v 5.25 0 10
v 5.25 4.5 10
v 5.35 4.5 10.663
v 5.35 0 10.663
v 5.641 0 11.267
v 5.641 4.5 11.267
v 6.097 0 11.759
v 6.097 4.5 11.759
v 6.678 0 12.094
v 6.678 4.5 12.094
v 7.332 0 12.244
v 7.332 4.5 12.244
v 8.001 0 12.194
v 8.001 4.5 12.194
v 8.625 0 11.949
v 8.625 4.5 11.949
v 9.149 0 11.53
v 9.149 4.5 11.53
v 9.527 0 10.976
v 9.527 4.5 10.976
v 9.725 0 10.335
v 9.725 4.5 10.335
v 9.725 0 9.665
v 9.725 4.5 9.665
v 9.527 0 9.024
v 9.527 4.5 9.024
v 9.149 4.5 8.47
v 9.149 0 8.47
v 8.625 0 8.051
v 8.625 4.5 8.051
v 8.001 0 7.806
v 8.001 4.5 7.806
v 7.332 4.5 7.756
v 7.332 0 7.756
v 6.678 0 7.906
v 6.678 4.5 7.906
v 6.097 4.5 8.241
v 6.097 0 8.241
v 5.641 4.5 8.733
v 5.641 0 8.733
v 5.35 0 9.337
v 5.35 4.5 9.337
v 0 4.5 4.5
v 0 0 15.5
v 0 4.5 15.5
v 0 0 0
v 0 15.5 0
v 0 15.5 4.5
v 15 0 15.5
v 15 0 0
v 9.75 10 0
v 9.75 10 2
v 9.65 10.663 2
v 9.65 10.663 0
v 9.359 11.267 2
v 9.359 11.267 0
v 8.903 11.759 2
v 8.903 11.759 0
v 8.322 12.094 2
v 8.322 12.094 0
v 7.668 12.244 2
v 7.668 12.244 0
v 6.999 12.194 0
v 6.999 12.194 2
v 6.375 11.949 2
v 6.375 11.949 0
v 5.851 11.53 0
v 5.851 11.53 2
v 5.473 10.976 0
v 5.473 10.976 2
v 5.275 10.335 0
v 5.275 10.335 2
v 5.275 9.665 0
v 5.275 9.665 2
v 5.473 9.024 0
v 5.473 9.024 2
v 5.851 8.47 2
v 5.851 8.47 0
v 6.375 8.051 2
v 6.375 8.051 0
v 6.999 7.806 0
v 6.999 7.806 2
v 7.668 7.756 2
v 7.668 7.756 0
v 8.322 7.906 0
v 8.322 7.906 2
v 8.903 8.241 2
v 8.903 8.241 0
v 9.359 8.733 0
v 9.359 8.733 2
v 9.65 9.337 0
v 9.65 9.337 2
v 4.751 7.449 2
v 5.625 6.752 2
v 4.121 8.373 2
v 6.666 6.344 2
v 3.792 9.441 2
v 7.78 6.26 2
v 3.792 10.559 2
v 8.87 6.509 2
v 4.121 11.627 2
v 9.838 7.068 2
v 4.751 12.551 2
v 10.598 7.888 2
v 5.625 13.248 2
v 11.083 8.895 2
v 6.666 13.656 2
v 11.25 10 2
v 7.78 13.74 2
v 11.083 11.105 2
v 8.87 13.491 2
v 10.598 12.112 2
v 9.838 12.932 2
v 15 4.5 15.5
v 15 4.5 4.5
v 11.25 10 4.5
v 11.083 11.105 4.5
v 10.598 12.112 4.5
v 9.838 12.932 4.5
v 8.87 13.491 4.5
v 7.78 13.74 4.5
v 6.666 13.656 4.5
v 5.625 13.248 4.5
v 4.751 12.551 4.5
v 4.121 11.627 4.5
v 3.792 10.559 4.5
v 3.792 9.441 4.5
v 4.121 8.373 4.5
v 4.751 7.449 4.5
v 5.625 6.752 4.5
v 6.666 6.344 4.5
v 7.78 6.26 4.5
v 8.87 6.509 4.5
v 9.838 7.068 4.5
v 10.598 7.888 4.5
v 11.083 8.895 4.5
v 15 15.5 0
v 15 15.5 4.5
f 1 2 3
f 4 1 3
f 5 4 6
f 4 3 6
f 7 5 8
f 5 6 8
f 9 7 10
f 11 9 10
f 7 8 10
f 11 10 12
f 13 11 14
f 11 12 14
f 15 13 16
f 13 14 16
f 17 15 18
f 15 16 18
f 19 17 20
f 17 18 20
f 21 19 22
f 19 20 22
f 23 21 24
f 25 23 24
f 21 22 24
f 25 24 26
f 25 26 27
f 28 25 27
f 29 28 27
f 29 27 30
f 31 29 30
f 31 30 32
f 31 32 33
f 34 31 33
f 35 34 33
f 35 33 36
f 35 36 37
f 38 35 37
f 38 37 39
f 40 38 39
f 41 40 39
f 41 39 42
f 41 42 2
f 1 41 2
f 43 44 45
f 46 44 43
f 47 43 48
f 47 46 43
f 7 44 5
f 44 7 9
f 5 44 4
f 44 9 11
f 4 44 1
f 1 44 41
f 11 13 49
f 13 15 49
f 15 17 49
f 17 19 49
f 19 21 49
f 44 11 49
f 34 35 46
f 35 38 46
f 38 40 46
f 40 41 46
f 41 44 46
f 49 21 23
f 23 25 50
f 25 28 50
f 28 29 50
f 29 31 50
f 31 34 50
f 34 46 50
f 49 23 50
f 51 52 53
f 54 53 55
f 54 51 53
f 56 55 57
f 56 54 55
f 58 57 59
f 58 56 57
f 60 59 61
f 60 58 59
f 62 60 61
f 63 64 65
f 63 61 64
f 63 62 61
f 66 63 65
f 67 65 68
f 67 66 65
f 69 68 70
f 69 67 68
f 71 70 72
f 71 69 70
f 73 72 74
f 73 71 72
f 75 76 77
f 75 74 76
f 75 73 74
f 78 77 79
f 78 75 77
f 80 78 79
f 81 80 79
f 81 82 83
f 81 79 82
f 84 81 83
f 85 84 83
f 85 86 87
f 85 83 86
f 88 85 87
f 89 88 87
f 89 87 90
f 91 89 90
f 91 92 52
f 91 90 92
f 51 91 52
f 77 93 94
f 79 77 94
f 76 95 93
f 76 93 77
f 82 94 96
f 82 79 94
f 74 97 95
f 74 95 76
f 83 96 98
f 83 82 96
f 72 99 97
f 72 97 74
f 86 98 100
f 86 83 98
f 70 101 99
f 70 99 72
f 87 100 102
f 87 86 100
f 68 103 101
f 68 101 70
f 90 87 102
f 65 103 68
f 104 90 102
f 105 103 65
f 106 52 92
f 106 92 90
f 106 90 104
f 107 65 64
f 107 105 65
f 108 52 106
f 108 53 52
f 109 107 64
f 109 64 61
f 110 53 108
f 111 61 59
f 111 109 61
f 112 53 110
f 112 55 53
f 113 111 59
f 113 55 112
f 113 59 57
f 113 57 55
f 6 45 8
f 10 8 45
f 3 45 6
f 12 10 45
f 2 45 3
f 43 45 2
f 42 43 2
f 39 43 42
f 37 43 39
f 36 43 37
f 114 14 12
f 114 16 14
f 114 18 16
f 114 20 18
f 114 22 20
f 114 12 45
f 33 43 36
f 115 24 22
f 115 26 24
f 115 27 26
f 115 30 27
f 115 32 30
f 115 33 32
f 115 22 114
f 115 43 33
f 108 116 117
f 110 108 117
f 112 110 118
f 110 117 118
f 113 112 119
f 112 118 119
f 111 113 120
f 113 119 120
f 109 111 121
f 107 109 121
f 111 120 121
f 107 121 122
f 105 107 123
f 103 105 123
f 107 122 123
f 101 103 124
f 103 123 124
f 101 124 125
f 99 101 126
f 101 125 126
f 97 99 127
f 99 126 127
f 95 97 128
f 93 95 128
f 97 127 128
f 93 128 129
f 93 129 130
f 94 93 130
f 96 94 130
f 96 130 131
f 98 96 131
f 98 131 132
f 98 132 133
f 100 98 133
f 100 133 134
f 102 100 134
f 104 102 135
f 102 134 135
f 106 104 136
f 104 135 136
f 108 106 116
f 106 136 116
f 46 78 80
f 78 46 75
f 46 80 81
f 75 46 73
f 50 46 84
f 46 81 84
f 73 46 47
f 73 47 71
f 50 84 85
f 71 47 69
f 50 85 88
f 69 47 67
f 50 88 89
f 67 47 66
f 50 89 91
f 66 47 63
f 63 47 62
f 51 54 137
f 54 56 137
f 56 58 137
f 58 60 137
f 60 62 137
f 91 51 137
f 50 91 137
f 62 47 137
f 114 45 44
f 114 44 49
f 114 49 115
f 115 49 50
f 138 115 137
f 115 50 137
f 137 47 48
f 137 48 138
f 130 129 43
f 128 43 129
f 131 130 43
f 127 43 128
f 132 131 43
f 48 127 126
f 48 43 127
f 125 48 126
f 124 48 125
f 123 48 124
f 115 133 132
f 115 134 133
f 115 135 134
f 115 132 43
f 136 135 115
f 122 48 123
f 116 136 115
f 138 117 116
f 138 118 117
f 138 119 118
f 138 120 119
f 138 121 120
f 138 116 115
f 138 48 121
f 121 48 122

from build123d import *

# Parameters (mm, degrees)
SKETCH_W        = 15
SKETCH_H        = 15.5
SKETCH_R        = 2.25
PAD_DEPTH       = 4.5
SKETCH001_R     = 3.75
POCKET_DEPTH    = 2.5
SKETCH002_W     = 15
SKETCH002_H     = 4.5
PAD001_DEPTH    = 11
SKETCH003_R     = 2.25
POCKET001_DEPTH = 6.5


with BuildPart() as part:
    # Sketch → Pad (new body)
    with BuildSketch(Plane.XY):
        with Locations((7.5, 7.75)):
            Rectangle(SKETCH_W, SKETCH_H)
        with Locations((7.5, 10)):
            Circle(SKETCH_R, mode=Mode.SUBTRACT)
    extrude(amount=PAD_DEPTH)

    # Sketch001 (on Face7 of Pad) → Pocket (cut)
    with BuildSketch(Plane.XY.offset(4.5)):
        with Locations((7.5, 10)):
            Circle(SKETCH001_R)
    extrude(amount=-POCKET_DEPTH, mode=Mode.SUBTRACT)

    # Sketch002 (on Face5 of Pocket) → Pad001 (join)
    with BuildSketch(Plane.XY.offset(4.5)):
        with Locations((7.5, 2.25)):
            Rectangle(SKETCH002_W, SKETCH002_H)
    extrude(amount=PAD001_DEPTH)

    # Sketch003 (on Face5 of Pad001) → Pocket001 (cut)
    with BuildSketch(Plane(origin=(0, 4.5, 0), x_dir=(-1, 0, 0), z_dir=(0, 1, 0))):
        with Locations((-7.5, 10)):
            Circle(SKETCH003_R)
    extrude(amount=-POCKET001_DEPTH, mode=Mode.SUBTRACT)


solid = part.part
